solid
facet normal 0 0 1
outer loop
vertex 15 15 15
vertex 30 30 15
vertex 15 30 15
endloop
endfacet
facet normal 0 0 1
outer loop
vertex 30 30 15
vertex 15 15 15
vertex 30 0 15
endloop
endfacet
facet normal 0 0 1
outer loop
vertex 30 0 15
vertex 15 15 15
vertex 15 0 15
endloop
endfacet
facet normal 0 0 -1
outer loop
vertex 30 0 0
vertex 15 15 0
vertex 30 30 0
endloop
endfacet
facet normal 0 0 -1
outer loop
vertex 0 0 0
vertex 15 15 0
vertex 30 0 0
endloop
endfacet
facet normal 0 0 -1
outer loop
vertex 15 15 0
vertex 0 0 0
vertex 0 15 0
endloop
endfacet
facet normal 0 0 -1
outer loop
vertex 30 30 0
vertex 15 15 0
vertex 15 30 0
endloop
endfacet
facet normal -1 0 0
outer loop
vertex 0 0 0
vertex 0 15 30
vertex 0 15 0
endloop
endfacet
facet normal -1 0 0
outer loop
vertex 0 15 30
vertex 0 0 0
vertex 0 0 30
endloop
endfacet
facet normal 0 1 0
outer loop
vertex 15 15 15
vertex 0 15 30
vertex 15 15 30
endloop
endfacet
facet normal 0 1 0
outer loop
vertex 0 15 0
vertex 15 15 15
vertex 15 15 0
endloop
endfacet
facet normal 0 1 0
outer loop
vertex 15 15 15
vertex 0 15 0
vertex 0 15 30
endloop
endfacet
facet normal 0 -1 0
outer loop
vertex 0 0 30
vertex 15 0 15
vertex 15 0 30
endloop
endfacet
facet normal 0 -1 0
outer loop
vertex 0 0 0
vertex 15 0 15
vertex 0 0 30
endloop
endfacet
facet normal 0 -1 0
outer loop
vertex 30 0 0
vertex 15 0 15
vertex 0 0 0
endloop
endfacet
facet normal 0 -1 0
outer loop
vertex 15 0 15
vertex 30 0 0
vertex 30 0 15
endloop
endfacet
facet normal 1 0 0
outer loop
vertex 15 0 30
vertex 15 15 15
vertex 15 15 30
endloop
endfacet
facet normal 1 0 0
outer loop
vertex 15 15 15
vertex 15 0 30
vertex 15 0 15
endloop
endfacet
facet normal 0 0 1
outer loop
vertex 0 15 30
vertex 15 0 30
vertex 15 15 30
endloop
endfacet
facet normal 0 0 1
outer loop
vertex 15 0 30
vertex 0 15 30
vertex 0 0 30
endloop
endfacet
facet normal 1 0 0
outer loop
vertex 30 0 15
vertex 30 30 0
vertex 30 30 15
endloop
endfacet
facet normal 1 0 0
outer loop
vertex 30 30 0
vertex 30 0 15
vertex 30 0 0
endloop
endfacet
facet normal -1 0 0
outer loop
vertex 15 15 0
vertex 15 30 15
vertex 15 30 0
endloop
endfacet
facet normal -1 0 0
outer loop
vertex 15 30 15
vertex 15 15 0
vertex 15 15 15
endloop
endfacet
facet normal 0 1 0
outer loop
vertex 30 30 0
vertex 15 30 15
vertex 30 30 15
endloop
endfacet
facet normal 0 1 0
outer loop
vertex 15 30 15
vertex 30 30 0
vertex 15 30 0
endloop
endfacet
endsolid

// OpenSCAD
// Fongo piece 3: Twisted hook. GPL-3.0; see README.txt.
// All cube positions derive from the canonical catalogue. z points up.
unit = 15; // mm, scale all pieces AND cards together
positions = [[0,0,0],[0,0,1],[1,0,0],[1,1,0]];
union() { for (p = positions) translate(p * unit) cube([unit, unit, unit]); }
